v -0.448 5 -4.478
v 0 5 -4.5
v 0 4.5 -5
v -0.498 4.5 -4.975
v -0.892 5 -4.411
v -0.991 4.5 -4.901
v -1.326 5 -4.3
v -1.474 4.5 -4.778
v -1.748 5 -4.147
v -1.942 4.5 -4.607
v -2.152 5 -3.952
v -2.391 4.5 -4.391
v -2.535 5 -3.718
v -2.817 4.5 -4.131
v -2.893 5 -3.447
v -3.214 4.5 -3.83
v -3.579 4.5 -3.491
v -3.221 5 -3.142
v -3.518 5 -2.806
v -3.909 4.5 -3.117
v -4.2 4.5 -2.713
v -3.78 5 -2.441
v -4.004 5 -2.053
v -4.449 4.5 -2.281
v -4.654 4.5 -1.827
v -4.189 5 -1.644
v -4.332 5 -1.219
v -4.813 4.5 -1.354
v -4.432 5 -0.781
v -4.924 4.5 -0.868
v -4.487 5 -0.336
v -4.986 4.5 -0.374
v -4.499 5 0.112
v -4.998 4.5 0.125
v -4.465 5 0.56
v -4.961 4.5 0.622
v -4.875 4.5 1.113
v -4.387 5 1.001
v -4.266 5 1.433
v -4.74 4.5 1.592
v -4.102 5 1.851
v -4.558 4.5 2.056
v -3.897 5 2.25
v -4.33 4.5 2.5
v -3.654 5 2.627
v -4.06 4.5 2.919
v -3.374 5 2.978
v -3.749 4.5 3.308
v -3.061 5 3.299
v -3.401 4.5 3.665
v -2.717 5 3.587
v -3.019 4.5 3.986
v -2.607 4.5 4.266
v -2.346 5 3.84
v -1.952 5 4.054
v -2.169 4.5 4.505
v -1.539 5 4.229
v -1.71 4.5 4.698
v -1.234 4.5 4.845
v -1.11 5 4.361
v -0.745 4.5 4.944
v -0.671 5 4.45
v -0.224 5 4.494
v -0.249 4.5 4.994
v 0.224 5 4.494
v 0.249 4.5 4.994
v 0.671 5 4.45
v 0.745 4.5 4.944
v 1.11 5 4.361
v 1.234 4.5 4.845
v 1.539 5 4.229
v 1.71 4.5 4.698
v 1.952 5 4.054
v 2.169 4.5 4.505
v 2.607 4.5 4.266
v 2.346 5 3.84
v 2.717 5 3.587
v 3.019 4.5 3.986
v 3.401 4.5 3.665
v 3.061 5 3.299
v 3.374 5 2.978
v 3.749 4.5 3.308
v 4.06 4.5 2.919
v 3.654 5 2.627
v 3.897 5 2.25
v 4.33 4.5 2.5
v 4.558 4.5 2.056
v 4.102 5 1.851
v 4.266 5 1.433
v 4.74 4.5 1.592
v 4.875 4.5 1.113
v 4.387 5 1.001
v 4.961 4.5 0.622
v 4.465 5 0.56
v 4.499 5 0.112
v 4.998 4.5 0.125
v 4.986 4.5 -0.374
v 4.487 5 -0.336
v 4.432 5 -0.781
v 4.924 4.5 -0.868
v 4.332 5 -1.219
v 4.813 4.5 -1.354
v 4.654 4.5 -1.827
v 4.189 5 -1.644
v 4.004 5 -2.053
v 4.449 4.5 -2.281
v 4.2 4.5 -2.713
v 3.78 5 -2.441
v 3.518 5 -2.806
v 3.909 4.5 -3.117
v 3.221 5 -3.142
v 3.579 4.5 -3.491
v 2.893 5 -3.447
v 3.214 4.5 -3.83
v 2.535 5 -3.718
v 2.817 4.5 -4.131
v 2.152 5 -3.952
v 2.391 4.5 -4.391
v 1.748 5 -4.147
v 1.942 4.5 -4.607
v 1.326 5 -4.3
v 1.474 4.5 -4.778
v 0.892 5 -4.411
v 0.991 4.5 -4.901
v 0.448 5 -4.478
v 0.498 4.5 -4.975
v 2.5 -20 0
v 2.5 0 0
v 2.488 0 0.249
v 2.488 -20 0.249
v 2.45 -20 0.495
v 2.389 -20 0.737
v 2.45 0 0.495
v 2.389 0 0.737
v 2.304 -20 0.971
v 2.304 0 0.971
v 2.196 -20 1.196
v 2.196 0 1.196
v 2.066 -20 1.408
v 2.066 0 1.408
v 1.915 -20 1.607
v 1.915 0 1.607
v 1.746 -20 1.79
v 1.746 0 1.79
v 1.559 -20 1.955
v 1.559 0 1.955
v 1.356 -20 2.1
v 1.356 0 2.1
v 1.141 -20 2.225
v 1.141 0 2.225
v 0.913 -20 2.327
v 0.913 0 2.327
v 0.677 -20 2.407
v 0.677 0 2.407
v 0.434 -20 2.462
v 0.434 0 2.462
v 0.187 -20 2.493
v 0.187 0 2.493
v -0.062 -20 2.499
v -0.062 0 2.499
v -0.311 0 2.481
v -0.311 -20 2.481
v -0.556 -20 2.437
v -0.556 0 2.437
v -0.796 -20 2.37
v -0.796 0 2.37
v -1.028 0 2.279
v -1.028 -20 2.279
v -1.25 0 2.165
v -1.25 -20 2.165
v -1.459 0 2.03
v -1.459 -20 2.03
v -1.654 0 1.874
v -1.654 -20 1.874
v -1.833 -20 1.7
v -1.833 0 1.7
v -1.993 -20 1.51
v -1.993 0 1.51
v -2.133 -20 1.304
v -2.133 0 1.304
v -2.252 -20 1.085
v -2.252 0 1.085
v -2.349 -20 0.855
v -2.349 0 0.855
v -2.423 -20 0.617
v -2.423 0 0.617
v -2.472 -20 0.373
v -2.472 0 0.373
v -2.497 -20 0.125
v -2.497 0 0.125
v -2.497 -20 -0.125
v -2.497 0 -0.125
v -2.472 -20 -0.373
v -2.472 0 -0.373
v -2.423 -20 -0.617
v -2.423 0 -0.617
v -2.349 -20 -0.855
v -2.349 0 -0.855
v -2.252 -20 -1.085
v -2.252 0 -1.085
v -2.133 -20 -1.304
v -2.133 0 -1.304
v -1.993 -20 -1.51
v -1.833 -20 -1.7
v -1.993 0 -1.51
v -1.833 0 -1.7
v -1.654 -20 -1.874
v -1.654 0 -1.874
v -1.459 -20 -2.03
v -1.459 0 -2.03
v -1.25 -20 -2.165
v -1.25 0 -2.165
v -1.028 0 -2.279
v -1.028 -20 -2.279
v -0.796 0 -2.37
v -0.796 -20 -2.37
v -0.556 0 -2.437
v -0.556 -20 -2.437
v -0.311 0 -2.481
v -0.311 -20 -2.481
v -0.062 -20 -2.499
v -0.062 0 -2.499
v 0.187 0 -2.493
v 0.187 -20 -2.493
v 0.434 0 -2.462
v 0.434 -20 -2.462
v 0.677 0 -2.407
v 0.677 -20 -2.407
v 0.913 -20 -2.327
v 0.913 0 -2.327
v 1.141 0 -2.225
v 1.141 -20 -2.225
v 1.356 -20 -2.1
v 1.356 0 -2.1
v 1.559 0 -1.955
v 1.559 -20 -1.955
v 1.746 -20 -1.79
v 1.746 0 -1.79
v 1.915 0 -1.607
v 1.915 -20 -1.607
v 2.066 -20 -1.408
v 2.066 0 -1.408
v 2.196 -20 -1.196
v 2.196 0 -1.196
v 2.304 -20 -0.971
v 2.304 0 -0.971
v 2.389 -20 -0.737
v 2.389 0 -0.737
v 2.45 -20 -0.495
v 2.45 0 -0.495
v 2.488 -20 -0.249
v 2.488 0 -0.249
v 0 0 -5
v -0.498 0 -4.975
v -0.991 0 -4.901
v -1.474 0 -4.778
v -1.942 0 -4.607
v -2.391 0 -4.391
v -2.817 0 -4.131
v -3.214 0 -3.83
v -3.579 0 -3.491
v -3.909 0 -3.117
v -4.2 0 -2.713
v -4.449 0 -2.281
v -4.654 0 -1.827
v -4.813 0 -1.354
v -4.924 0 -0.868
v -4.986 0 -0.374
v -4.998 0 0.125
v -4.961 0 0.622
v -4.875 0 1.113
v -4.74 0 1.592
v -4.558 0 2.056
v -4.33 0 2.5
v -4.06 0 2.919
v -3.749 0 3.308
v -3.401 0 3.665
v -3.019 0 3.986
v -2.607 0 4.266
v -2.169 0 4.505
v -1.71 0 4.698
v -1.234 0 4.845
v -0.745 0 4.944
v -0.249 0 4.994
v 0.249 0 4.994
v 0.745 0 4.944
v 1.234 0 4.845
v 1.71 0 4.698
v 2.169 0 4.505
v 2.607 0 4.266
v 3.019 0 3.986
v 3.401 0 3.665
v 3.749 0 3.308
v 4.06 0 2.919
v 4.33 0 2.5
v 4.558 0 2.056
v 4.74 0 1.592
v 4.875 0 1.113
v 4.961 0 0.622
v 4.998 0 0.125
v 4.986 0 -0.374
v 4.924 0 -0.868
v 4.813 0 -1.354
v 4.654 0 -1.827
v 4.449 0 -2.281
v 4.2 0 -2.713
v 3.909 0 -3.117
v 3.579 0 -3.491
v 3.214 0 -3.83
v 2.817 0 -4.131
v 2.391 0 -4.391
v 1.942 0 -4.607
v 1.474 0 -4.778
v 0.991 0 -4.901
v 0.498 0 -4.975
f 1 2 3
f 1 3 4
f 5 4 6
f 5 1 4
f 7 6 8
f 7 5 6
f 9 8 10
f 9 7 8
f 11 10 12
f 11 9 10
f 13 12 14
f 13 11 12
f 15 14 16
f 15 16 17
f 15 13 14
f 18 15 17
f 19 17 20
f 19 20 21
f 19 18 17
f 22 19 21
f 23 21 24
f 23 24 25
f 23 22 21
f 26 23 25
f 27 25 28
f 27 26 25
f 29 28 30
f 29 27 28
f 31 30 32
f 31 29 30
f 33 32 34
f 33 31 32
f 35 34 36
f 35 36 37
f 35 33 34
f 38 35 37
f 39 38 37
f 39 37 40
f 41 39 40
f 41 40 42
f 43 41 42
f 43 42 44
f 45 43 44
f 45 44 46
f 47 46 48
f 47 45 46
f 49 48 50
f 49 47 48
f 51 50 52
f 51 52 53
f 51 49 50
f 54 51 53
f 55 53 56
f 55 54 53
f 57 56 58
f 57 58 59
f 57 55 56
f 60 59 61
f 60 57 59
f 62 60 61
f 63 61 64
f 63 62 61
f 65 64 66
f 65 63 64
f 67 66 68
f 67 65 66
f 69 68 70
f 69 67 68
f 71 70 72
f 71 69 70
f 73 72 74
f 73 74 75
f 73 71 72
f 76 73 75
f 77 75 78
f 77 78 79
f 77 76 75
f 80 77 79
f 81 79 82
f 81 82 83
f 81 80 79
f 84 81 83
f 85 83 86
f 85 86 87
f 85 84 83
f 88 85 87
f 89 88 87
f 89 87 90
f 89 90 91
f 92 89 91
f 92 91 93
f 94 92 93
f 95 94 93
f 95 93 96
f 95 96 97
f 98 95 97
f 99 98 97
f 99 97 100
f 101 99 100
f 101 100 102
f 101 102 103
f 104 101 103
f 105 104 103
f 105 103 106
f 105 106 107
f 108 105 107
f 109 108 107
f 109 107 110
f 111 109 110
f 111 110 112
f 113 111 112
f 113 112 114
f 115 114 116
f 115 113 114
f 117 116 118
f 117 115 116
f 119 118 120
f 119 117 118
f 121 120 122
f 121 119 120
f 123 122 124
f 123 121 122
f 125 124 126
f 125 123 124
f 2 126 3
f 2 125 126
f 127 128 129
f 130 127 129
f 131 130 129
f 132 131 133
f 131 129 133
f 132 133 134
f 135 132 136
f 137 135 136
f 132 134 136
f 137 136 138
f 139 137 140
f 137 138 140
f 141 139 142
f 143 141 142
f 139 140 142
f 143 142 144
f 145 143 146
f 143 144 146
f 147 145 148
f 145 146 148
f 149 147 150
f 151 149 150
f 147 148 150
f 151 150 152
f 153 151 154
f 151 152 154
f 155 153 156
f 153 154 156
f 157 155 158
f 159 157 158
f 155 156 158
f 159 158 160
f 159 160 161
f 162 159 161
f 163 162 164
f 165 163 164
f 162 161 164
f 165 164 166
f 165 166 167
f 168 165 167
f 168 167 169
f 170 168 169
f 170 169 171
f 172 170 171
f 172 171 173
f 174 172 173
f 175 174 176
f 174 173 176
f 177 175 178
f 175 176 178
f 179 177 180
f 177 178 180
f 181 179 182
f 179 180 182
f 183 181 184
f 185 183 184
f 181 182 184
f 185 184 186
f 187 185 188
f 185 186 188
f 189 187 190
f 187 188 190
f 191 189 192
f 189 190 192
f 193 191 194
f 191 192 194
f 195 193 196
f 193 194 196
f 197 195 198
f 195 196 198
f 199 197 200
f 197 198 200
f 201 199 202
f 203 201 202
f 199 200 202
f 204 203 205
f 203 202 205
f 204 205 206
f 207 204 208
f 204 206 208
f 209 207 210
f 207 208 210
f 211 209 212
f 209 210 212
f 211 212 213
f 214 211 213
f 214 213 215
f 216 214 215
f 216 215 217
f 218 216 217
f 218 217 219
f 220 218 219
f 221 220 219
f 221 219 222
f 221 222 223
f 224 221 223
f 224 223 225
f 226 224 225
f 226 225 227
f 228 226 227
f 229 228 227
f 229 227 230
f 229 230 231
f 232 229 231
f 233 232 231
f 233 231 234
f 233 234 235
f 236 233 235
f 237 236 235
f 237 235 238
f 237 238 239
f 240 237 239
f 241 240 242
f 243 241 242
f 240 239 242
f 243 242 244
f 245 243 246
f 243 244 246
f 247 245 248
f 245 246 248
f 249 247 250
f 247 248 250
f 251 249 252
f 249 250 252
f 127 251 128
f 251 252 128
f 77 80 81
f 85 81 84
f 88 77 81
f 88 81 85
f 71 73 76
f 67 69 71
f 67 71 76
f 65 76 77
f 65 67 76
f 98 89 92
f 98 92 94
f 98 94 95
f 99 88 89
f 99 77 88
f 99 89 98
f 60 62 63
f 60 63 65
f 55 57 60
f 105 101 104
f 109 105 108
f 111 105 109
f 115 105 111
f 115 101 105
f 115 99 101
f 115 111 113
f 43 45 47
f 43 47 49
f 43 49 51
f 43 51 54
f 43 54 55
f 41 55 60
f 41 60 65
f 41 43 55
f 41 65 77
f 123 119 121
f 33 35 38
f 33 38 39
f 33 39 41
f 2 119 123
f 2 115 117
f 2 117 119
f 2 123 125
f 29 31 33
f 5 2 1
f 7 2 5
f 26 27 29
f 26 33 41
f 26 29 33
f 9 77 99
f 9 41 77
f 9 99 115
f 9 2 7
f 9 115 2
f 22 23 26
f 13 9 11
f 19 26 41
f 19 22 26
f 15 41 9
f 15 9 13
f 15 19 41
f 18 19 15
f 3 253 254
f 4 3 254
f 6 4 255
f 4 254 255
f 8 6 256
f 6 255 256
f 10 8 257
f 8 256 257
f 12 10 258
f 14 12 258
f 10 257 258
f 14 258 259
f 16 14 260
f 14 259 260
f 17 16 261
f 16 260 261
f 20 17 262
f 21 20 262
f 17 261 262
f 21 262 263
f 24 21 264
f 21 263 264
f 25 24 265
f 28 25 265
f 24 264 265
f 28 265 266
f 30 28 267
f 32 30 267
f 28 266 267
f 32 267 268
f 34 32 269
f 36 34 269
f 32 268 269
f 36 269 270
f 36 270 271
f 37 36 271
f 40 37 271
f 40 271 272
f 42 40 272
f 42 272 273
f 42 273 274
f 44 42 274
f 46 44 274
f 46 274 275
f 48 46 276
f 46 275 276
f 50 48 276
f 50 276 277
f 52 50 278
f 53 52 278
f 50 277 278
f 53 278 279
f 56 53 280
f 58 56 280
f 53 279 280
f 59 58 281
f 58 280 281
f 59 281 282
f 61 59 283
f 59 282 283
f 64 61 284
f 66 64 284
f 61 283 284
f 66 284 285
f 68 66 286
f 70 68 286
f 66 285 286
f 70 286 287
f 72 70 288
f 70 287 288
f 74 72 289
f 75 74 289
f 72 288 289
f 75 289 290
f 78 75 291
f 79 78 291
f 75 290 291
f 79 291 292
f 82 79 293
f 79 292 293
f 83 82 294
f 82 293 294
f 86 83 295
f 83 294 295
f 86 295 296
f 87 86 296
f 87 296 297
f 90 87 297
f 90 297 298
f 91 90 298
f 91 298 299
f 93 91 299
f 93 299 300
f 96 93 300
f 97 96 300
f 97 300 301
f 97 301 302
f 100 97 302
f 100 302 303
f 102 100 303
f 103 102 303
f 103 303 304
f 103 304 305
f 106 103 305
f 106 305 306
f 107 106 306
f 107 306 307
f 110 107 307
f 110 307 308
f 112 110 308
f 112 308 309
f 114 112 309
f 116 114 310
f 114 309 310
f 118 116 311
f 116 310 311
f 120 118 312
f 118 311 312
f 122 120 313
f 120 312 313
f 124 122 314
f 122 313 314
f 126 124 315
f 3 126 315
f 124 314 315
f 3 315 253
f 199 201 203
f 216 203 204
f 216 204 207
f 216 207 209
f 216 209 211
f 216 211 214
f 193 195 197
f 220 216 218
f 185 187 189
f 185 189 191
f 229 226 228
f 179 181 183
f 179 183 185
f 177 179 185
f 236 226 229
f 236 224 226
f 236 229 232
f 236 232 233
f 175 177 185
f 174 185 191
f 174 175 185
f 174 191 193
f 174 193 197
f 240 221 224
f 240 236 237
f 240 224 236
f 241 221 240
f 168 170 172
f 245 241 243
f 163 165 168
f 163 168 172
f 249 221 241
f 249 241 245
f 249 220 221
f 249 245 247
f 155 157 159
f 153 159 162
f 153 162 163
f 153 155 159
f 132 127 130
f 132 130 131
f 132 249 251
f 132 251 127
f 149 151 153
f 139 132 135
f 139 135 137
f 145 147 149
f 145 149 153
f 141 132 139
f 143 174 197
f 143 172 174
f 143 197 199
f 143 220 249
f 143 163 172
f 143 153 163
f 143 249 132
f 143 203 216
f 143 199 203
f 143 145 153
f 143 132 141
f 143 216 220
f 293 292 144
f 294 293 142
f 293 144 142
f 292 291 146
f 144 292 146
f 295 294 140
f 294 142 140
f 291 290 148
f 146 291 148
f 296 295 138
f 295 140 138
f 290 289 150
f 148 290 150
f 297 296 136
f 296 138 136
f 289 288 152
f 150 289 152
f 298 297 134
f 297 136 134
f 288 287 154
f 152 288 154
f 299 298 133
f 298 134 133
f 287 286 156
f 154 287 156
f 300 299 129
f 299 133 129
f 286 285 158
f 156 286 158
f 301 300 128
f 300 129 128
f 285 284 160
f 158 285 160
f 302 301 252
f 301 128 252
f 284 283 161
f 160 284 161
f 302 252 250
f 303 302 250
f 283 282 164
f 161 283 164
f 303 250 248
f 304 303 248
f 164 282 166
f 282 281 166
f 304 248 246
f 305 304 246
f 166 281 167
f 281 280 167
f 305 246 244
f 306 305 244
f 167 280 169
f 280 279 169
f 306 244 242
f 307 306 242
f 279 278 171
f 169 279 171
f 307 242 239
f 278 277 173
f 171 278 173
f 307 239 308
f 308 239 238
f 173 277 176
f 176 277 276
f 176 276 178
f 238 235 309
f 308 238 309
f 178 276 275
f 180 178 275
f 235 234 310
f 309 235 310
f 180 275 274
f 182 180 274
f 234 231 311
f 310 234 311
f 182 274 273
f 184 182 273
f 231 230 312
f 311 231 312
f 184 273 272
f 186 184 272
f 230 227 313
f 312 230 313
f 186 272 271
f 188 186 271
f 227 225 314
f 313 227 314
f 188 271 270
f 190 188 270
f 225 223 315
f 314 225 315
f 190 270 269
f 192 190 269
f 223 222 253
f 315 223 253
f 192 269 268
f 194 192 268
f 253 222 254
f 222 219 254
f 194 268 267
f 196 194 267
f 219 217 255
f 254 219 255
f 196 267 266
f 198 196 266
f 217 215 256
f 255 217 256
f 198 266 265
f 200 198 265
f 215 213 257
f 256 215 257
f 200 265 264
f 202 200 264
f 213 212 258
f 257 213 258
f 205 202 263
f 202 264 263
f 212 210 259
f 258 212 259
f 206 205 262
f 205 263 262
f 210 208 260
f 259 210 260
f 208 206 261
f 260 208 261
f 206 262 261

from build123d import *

# Parameters (mm, degrees)
SK_CBORE_R      = 5
BD_CBORE_DEPTH  = 5
SK_THREAD_R     = 2.5
BD_THREAD_DEPTH = 20
CF_CBORE_SIZE   = 0.5


with BuildPart() as part:
    # SK_CBORE → BD_CBORE (new body)
    with BuildSketch(Plane(origin=(0, 0, 0), x_dir=(0, 0, -1), z_dir=(0, 1, 0))):
        Circle(SK_CBORE_R)
    extrude(amount=BD_CBORE_DEPTH)

    # SK_THREAD → BD_THREAD (add)
    with BuildSketch(Plane.XZ):
        Circle(SK_THREAD_R)
    extrude(amount=BD_THREAD_DEPTH)

    # CF_CBORE
    cf_cbore_edges = [part.edges().sort_by_distance(p)[0] for p in [
        (0, 5, 5),
    ]]
    chamfer(cf_cbore_edges, length=CF_CBORE_SIZE)


solid = part.part
